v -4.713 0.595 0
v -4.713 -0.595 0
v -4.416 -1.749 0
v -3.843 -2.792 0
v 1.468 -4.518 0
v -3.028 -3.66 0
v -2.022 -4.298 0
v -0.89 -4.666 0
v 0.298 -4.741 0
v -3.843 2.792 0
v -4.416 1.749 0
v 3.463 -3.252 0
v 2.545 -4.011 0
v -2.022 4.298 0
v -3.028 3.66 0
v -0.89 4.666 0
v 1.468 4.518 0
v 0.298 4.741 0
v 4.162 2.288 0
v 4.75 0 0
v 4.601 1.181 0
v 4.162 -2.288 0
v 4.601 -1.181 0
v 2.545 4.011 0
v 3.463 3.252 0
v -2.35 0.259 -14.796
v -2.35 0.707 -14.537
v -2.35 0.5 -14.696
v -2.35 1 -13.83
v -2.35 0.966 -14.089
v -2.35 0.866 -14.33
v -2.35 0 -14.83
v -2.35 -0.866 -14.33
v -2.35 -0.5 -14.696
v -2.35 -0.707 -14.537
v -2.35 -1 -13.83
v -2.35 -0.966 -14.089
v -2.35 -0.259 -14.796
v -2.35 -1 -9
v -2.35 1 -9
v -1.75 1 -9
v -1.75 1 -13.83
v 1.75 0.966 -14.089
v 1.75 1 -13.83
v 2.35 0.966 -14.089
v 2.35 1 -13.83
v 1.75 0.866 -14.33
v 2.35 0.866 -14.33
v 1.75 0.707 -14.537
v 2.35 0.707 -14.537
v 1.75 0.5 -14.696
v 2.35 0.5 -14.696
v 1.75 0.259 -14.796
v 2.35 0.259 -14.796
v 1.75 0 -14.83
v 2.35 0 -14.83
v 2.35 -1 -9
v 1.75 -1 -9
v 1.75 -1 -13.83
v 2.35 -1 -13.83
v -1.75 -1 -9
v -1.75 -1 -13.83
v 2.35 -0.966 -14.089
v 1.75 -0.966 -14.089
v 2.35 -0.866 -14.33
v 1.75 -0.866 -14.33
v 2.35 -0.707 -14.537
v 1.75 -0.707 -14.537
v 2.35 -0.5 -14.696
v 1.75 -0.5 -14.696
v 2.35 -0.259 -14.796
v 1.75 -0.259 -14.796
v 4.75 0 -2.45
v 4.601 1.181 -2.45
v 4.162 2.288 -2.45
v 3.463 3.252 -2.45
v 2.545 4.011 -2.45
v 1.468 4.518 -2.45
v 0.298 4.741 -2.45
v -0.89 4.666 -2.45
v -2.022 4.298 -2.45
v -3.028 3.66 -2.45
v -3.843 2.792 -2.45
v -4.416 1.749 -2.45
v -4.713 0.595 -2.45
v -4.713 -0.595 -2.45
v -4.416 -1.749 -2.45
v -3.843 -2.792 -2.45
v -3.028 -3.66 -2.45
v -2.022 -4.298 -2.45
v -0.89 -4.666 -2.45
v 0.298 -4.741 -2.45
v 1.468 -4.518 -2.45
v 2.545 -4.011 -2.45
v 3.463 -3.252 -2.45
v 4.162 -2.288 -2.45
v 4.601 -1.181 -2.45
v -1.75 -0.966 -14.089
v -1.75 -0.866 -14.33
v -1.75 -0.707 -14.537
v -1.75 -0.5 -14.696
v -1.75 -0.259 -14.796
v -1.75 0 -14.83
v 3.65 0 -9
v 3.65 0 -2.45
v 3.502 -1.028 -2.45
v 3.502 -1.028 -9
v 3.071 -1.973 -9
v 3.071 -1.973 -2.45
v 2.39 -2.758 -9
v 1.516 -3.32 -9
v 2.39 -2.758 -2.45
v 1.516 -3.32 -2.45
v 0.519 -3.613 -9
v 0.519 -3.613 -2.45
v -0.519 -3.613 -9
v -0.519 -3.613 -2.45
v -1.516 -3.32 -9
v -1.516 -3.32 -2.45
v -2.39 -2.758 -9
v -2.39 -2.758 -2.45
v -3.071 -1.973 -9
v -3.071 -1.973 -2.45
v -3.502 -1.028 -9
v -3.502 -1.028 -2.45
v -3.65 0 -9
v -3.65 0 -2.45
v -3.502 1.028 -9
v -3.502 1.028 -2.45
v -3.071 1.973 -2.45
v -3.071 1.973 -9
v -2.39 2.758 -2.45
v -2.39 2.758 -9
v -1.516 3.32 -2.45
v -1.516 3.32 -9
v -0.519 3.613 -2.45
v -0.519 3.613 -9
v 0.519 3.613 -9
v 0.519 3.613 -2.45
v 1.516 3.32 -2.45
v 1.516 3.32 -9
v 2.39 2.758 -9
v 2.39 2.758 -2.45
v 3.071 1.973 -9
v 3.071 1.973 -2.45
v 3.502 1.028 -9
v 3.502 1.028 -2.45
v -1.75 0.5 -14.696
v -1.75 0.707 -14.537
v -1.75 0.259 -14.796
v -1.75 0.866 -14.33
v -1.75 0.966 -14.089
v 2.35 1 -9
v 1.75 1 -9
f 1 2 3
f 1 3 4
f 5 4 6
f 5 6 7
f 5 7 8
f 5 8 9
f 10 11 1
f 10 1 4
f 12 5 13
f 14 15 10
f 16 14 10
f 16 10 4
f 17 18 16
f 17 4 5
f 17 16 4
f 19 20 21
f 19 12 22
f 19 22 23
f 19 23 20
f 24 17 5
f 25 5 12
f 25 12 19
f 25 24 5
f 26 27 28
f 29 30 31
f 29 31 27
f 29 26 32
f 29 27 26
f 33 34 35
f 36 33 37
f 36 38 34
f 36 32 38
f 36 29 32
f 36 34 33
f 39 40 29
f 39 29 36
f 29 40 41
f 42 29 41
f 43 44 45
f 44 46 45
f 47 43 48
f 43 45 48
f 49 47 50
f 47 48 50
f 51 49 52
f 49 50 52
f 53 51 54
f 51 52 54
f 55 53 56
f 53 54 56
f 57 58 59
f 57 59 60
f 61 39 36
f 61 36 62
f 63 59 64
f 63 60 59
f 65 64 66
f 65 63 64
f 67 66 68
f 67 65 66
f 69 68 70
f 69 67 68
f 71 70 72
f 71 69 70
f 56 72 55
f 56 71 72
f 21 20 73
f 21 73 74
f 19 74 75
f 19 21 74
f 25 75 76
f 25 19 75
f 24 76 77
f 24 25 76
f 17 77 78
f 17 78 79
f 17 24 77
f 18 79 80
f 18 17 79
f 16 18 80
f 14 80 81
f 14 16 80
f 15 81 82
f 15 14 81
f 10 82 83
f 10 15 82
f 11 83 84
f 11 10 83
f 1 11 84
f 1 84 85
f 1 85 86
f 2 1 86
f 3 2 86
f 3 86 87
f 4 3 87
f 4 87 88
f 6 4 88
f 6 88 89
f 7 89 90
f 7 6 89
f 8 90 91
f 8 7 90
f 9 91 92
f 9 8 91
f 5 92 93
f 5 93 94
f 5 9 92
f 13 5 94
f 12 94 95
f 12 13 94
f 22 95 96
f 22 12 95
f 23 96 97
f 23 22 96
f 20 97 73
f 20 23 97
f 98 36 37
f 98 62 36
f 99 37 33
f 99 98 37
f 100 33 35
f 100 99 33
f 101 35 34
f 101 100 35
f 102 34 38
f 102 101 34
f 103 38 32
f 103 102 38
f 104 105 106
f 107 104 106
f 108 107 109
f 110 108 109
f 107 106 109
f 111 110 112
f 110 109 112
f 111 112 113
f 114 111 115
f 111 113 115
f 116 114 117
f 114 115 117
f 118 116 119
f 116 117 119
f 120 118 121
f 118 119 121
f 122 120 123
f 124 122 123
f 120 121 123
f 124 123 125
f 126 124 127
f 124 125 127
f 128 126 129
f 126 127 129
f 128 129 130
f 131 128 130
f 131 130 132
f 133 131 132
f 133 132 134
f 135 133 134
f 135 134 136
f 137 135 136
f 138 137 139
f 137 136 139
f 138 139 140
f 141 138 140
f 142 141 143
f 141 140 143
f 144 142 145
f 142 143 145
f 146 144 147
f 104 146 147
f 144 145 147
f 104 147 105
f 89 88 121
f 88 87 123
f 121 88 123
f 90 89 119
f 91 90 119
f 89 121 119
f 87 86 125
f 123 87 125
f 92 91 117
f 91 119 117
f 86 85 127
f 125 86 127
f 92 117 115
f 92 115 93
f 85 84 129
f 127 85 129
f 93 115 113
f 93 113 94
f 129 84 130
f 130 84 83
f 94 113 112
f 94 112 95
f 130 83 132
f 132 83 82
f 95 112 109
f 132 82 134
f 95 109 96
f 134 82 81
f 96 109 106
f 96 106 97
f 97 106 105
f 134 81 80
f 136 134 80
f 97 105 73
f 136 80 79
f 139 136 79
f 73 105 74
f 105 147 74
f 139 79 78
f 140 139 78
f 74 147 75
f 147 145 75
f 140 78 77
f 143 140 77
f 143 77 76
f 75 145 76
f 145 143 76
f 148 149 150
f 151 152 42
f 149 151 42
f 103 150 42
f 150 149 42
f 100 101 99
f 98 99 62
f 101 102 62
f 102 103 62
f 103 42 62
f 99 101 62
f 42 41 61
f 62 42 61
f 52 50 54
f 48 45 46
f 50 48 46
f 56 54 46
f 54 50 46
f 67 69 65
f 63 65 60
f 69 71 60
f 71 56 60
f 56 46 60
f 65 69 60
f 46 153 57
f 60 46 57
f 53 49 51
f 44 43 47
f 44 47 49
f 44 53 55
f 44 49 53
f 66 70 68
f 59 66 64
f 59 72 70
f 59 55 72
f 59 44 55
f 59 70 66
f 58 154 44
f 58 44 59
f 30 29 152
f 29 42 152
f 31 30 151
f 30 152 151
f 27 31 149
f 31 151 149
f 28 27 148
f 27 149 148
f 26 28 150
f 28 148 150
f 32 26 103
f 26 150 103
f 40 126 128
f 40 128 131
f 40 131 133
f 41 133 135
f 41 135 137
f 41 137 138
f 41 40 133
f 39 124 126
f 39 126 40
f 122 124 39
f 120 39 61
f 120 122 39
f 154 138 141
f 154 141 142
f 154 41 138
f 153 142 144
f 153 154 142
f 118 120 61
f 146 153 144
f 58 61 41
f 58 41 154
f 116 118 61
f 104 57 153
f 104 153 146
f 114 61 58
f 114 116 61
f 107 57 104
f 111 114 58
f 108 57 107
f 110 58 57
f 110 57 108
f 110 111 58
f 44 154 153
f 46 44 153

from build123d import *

# Parameters (mm, degrees)
F0_R     = 4.75
F1_DEPTH = 2.45
F2_R     = 3.65
F3_DEPTH = 6.55
F4_W     = 0.6
F4_H     = 2
F5_DEPTH = 5.83
F6_R     = 0.99999


# Not quite as in the source:
# - a fillet or chamfer is up to 0.001 mm smaller than in the source, because OpenCascade refuses the exact size


with BuildPart() as f1:
    # F0 (on Top) → F1 (new body)
    with BuildSketch(Plane.XY):
        Circle(F0_R)
    extrude(amount=-F1_DEPTH)

    # F2 (on face) → F3 (join)
    with BuildSketch(Plane(origin=(0, 0, -2.45), x_dir=(1, 0, 0), z_dir=(0, 0, -1))):
        Circle(F2_R)
    extrude(amount=F3_DEPTH)

    # F4 (on face) → F5 (join)
    with BuildSketch(Plane(origin=(0, 0, -9), x_dir=(1, 0, 0), z_dir=(0, 0, -1))):
        with Locations((-2.05, 0)):
            Rectangle(F4_W, F4_H)
        with Locations((2.05, 0)):
            Rectangle(F4_W, F4_H)
    extrude(amount=F5_DEPTH)

    # F6 (radius 1 in the source; OpenCascade refuses exactly that, so slightly less here)
    f6_edges = [f1.edges().sort_by_distance(p)[0] for p in [
        (-2.05, -1, -14.83),
        (2.05, -1, -14.83),
        (2.05, 1, -14.83),
        (-2.05, 1, -14.83),
    ]]
    fillet(f6_edges, radius=F6_R)


solid = f1.part
